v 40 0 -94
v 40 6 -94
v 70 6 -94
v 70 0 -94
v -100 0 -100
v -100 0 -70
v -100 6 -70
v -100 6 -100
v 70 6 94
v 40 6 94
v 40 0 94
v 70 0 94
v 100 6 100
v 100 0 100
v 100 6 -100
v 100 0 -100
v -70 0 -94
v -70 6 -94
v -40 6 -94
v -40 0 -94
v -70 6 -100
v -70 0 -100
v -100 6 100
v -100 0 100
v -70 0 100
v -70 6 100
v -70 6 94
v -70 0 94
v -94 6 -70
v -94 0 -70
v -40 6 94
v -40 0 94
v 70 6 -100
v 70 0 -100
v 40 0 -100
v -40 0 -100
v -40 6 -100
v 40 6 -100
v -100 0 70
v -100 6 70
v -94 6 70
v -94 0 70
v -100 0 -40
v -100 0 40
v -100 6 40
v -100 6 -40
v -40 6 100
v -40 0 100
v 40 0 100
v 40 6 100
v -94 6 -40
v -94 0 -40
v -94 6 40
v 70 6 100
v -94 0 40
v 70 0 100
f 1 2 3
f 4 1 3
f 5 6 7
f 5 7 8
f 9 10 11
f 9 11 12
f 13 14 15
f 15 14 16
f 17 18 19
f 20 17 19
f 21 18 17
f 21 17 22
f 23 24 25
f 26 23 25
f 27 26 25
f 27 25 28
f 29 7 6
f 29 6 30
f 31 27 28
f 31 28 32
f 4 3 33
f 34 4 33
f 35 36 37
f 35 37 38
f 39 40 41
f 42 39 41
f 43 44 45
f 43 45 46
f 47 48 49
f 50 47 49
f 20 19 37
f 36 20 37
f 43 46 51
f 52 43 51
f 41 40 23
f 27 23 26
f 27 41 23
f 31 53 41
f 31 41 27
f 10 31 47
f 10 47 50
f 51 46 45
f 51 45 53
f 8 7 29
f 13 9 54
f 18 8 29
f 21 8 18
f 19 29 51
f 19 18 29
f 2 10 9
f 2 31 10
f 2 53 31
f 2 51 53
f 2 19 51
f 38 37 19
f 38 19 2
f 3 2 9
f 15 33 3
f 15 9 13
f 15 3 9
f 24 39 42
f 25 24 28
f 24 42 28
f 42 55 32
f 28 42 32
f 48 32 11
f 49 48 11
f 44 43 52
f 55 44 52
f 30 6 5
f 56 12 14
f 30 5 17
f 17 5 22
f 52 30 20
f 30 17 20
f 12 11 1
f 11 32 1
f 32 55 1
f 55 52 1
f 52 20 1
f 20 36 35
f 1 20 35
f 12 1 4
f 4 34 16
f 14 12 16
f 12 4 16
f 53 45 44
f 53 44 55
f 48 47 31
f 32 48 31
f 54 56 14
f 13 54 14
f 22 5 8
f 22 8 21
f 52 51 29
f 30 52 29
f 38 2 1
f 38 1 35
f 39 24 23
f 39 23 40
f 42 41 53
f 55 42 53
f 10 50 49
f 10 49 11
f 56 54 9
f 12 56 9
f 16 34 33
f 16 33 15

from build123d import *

# Parameters (mm, degrees)
ESBO_O1_W                = 200
ESBO_O1_H                = 200
RESSALTO_EXTRUS_O1_DEPTH = 6
ESBO_O2_W                = 30
ESBO_O2_H                = 6
ESBO_O2_W_2              = 6
ESBO_O2_H_2              = 30
CORTE_EXTRUS_O1_DEPTH    = 10


with BuildPart() as part:
    # Esboço1 → Ressalto-extrusão1 (new body)
    with BuildSketch(Plane(origin=(0, 0, 0), x_dir=(1, 0, 0), z_dir=(0, 1, 0))):
        Rectangle(ESBO_O1_W, ESBO_O1_H)
    extrude(amount=RESSALTO_EXTRUS_O1_DEPTH)

    # Esboço2 → Corte-extrusão1 (cut)
    with BuildSketch(Plane(origin=(0, 6, 0), x_dir=(1, 0, 0), z_dir=(0, 1, 0))):
        with Locations((-55, -97)):
            Rectangle(ESBO_O2_W, ESBO_O2_H)
        with Locations((55, -97)):
            Rectangle(ESBO_O2_W, ESBO_O2_H)
        with Locations((-55, 97)):
            Rectangle(ESBO_O2_W, ESBO_O2_H)
        with Locations((55, 97)):
            Rectangle(ESBO_O2_W, ESBO_O2_H)
        with Locations((-97, 55)):
            Rectangle(ESBO_O2_W_2, ESBO_O2_H_2)
        with Locations((-97, -55)):
            Rectangle(ESBO_O2_W_2, ESBO_O2_H_2)
    extrude(amount=-CORTE_EXTRUS_O1_DEPTH, mode=Mode.SUBTRACT)


solid = part.part
